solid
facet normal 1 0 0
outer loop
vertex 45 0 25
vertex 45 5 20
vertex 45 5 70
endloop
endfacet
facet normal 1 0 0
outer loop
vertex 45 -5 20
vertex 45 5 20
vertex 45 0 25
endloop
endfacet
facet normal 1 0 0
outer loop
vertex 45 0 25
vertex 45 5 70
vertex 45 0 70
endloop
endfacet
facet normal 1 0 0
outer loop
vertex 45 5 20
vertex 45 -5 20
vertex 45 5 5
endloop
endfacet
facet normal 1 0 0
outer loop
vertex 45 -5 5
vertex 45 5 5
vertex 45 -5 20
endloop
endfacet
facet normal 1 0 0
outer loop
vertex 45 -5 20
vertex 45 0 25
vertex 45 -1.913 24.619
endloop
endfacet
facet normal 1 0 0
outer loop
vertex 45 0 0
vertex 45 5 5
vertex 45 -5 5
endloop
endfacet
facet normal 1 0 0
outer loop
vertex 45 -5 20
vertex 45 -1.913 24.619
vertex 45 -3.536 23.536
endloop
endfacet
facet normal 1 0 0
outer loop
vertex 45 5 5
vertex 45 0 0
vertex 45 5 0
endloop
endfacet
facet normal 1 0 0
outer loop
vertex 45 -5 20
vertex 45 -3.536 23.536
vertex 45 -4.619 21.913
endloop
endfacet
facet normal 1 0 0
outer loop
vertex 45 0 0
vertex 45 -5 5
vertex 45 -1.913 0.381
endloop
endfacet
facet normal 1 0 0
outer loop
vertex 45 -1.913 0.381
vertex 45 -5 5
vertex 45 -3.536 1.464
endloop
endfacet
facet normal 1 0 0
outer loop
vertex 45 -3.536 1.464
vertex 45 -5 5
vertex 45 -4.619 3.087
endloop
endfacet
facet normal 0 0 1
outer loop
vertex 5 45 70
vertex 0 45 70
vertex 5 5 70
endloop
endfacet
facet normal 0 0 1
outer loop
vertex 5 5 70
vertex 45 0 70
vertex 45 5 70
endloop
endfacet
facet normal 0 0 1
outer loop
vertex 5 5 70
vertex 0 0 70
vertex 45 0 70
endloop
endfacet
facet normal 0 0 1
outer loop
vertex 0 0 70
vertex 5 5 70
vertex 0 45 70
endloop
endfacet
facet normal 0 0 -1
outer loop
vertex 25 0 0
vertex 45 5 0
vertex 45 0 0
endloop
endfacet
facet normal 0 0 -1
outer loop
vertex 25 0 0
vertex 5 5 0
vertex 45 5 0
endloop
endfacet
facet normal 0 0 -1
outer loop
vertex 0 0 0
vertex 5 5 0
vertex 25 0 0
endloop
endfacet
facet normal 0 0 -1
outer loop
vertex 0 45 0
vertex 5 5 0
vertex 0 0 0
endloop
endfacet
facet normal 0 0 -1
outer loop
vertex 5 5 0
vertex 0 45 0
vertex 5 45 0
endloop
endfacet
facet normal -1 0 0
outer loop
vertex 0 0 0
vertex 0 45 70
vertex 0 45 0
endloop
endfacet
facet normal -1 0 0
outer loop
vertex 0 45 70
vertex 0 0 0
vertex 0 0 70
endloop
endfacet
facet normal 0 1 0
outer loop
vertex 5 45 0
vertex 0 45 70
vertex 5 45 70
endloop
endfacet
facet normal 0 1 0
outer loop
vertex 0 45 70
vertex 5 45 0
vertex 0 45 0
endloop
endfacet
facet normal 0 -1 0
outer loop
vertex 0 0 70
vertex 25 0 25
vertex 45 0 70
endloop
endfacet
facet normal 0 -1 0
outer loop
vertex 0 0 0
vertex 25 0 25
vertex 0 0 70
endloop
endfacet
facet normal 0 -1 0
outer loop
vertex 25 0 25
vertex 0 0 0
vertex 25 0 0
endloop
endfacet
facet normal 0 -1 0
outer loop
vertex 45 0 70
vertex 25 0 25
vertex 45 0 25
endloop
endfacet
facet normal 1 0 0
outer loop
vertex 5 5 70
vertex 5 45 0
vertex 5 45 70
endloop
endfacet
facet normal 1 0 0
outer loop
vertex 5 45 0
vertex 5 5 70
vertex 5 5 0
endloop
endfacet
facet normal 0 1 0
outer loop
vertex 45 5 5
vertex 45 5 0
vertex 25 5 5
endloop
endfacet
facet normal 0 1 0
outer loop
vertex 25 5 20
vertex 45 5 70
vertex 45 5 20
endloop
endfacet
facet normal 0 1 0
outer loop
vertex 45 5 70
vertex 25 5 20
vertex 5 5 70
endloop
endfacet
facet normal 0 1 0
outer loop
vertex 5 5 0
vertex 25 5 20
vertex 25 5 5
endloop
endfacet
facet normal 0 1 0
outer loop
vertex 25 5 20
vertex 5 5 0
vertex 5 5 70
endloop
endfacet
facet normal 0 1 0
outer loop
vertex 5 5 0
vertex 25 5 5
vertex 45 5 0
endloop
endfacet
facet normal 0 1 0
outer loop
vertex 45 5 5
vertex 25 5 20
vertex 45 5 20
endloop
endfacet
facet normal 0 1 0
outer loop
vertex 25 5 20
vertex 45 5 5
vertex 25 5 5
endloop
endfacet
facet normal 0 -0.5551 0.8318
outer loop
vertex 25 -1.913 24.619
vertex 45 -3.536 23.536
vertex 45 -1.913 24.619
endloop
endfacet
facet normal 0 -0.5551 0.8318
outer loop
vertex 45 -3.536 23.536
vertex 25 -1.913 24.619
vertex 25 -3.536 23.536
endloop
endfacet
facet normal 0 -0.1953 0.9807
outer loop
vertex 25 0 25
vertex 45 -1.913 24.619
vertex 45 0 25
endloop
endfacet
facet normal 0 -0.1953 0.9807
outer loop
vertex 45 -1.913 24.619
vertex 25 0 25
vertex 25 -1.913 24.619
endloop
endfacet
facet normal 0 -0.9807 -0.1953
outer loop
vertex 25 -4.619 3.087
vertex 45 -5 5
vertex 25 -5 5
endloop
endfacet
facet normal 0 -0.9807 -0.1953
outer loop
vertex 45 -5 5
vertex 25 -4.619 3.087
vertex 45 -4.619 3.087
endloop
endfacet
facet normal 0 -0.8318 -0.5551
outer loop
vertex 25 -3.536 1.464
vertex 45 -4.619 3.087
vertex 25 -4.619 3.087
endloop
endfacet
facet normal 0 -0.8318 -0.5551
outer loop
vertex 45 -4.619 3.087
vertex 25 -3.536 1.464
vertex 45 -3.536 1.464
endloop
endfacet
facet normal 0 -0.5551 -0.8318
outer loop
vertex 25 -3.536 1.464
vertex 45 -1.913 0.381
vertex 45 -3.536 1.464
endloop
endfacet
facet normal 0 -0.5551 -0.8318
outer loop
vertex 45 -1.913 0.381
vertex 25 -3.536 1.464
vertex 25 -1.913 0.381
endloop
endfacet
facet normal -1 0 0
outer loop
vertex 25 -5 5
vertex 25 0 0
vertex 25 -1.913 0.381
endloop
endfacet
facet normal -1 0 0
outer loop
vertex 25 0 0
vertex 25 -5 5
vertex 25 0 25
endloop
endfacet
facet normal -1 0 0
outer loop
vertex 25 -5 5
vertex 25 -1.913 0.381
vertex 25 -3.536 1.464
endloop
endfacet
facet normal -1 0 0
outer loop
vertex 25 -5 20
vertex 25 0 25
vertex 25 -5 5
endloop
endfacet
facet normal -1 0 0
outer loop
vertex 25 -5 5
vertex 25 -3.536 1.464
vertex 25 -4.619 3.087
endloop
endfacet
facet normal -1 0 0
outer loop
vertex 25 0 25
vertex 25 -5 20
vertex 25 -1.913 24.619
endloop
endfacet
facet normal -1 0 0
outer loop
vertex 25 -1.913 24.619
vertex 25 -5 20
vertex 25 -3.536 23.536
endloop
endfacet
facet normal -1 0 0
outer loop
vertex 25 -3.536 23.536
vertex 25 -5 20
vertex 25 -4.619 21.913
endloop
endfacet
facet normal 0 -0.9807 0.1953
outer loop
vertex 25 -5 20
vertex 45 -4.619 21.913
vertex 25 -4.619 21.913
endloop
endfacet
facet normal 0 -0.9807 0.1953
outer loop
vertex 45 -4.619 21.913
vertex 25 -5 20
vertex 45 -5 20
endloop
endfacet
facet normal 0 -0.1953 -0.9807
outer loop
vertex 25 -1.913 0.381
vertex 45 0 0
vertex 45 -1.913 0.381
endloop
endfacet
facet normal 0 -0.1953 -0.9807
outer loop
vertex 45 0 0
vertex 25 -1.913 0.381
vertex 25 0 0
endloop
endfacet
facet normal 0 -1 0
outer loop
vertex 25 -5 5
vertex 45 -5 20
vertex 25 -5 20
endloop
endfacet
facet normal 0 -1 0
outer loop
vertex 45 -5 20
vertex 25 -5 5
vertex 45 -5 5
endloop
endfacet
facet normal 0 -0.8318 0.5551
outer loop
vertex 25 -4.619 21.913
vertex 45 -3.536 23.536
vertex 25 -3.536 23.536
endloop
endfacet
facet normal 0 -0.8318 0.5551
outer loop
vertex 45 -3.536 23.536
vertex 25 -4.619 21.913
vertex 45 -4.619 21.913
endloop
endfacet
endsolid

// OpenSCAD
mount_edge = 45;
laser_edge = 40;
laser_mount_hole=8;
mount_height = 70;
mount_thickness = 5;

module mount_cube ( ) { 
    cube(
    [mount_edge,
    mount_edge,
    mount_height,
    ],
    center=false);
}

difference() {
translate( v = [0,
                0,
                0] ) {
    mount_cube();
}
translate( v = [mount_thickness,
                    mount_thickness,
                    0] ) {
                        color("red") {

        mount_cube();
    }
}
}

translate([mount_edge-laser_edge/2,0,20]) {
    color("red")
    rotate([0,90,0]) {
        hull() {
            translate([15,0,0]) 
                cylinder(h=20,d=10,center=false);
            cylinder(h=20,d=10,center=false);
        }
    }
}
/*
translate( v = [0,
                0,
                0] ) {
    cube(
        [pillars,
        pillars,
        edge,
        ],
        center=false);
}

translate( v = [edge - pillars,
                edge - pillars,
                0] ) {
    cube(
        [pillars,
        pillars,
        edge,
        ],
        center=false);
}

translate( v = [0,
                edge - pillars,
                0] ) {
    cube(
        [pillars,
        pillars,
        edge,
        ],
        center=false);
}

translate( v = [edge - pillars,
                0,
                0] ) {
    cube(
        [pillars,
        pillars,
        edge,
        ],
        center=false);
}

// Top
translate( v = [0,
                0, 
                edge - pillars] ) {
    cube(
        [edge,
        edge,
        pillars,
        ],
        center=false);
}
*/
